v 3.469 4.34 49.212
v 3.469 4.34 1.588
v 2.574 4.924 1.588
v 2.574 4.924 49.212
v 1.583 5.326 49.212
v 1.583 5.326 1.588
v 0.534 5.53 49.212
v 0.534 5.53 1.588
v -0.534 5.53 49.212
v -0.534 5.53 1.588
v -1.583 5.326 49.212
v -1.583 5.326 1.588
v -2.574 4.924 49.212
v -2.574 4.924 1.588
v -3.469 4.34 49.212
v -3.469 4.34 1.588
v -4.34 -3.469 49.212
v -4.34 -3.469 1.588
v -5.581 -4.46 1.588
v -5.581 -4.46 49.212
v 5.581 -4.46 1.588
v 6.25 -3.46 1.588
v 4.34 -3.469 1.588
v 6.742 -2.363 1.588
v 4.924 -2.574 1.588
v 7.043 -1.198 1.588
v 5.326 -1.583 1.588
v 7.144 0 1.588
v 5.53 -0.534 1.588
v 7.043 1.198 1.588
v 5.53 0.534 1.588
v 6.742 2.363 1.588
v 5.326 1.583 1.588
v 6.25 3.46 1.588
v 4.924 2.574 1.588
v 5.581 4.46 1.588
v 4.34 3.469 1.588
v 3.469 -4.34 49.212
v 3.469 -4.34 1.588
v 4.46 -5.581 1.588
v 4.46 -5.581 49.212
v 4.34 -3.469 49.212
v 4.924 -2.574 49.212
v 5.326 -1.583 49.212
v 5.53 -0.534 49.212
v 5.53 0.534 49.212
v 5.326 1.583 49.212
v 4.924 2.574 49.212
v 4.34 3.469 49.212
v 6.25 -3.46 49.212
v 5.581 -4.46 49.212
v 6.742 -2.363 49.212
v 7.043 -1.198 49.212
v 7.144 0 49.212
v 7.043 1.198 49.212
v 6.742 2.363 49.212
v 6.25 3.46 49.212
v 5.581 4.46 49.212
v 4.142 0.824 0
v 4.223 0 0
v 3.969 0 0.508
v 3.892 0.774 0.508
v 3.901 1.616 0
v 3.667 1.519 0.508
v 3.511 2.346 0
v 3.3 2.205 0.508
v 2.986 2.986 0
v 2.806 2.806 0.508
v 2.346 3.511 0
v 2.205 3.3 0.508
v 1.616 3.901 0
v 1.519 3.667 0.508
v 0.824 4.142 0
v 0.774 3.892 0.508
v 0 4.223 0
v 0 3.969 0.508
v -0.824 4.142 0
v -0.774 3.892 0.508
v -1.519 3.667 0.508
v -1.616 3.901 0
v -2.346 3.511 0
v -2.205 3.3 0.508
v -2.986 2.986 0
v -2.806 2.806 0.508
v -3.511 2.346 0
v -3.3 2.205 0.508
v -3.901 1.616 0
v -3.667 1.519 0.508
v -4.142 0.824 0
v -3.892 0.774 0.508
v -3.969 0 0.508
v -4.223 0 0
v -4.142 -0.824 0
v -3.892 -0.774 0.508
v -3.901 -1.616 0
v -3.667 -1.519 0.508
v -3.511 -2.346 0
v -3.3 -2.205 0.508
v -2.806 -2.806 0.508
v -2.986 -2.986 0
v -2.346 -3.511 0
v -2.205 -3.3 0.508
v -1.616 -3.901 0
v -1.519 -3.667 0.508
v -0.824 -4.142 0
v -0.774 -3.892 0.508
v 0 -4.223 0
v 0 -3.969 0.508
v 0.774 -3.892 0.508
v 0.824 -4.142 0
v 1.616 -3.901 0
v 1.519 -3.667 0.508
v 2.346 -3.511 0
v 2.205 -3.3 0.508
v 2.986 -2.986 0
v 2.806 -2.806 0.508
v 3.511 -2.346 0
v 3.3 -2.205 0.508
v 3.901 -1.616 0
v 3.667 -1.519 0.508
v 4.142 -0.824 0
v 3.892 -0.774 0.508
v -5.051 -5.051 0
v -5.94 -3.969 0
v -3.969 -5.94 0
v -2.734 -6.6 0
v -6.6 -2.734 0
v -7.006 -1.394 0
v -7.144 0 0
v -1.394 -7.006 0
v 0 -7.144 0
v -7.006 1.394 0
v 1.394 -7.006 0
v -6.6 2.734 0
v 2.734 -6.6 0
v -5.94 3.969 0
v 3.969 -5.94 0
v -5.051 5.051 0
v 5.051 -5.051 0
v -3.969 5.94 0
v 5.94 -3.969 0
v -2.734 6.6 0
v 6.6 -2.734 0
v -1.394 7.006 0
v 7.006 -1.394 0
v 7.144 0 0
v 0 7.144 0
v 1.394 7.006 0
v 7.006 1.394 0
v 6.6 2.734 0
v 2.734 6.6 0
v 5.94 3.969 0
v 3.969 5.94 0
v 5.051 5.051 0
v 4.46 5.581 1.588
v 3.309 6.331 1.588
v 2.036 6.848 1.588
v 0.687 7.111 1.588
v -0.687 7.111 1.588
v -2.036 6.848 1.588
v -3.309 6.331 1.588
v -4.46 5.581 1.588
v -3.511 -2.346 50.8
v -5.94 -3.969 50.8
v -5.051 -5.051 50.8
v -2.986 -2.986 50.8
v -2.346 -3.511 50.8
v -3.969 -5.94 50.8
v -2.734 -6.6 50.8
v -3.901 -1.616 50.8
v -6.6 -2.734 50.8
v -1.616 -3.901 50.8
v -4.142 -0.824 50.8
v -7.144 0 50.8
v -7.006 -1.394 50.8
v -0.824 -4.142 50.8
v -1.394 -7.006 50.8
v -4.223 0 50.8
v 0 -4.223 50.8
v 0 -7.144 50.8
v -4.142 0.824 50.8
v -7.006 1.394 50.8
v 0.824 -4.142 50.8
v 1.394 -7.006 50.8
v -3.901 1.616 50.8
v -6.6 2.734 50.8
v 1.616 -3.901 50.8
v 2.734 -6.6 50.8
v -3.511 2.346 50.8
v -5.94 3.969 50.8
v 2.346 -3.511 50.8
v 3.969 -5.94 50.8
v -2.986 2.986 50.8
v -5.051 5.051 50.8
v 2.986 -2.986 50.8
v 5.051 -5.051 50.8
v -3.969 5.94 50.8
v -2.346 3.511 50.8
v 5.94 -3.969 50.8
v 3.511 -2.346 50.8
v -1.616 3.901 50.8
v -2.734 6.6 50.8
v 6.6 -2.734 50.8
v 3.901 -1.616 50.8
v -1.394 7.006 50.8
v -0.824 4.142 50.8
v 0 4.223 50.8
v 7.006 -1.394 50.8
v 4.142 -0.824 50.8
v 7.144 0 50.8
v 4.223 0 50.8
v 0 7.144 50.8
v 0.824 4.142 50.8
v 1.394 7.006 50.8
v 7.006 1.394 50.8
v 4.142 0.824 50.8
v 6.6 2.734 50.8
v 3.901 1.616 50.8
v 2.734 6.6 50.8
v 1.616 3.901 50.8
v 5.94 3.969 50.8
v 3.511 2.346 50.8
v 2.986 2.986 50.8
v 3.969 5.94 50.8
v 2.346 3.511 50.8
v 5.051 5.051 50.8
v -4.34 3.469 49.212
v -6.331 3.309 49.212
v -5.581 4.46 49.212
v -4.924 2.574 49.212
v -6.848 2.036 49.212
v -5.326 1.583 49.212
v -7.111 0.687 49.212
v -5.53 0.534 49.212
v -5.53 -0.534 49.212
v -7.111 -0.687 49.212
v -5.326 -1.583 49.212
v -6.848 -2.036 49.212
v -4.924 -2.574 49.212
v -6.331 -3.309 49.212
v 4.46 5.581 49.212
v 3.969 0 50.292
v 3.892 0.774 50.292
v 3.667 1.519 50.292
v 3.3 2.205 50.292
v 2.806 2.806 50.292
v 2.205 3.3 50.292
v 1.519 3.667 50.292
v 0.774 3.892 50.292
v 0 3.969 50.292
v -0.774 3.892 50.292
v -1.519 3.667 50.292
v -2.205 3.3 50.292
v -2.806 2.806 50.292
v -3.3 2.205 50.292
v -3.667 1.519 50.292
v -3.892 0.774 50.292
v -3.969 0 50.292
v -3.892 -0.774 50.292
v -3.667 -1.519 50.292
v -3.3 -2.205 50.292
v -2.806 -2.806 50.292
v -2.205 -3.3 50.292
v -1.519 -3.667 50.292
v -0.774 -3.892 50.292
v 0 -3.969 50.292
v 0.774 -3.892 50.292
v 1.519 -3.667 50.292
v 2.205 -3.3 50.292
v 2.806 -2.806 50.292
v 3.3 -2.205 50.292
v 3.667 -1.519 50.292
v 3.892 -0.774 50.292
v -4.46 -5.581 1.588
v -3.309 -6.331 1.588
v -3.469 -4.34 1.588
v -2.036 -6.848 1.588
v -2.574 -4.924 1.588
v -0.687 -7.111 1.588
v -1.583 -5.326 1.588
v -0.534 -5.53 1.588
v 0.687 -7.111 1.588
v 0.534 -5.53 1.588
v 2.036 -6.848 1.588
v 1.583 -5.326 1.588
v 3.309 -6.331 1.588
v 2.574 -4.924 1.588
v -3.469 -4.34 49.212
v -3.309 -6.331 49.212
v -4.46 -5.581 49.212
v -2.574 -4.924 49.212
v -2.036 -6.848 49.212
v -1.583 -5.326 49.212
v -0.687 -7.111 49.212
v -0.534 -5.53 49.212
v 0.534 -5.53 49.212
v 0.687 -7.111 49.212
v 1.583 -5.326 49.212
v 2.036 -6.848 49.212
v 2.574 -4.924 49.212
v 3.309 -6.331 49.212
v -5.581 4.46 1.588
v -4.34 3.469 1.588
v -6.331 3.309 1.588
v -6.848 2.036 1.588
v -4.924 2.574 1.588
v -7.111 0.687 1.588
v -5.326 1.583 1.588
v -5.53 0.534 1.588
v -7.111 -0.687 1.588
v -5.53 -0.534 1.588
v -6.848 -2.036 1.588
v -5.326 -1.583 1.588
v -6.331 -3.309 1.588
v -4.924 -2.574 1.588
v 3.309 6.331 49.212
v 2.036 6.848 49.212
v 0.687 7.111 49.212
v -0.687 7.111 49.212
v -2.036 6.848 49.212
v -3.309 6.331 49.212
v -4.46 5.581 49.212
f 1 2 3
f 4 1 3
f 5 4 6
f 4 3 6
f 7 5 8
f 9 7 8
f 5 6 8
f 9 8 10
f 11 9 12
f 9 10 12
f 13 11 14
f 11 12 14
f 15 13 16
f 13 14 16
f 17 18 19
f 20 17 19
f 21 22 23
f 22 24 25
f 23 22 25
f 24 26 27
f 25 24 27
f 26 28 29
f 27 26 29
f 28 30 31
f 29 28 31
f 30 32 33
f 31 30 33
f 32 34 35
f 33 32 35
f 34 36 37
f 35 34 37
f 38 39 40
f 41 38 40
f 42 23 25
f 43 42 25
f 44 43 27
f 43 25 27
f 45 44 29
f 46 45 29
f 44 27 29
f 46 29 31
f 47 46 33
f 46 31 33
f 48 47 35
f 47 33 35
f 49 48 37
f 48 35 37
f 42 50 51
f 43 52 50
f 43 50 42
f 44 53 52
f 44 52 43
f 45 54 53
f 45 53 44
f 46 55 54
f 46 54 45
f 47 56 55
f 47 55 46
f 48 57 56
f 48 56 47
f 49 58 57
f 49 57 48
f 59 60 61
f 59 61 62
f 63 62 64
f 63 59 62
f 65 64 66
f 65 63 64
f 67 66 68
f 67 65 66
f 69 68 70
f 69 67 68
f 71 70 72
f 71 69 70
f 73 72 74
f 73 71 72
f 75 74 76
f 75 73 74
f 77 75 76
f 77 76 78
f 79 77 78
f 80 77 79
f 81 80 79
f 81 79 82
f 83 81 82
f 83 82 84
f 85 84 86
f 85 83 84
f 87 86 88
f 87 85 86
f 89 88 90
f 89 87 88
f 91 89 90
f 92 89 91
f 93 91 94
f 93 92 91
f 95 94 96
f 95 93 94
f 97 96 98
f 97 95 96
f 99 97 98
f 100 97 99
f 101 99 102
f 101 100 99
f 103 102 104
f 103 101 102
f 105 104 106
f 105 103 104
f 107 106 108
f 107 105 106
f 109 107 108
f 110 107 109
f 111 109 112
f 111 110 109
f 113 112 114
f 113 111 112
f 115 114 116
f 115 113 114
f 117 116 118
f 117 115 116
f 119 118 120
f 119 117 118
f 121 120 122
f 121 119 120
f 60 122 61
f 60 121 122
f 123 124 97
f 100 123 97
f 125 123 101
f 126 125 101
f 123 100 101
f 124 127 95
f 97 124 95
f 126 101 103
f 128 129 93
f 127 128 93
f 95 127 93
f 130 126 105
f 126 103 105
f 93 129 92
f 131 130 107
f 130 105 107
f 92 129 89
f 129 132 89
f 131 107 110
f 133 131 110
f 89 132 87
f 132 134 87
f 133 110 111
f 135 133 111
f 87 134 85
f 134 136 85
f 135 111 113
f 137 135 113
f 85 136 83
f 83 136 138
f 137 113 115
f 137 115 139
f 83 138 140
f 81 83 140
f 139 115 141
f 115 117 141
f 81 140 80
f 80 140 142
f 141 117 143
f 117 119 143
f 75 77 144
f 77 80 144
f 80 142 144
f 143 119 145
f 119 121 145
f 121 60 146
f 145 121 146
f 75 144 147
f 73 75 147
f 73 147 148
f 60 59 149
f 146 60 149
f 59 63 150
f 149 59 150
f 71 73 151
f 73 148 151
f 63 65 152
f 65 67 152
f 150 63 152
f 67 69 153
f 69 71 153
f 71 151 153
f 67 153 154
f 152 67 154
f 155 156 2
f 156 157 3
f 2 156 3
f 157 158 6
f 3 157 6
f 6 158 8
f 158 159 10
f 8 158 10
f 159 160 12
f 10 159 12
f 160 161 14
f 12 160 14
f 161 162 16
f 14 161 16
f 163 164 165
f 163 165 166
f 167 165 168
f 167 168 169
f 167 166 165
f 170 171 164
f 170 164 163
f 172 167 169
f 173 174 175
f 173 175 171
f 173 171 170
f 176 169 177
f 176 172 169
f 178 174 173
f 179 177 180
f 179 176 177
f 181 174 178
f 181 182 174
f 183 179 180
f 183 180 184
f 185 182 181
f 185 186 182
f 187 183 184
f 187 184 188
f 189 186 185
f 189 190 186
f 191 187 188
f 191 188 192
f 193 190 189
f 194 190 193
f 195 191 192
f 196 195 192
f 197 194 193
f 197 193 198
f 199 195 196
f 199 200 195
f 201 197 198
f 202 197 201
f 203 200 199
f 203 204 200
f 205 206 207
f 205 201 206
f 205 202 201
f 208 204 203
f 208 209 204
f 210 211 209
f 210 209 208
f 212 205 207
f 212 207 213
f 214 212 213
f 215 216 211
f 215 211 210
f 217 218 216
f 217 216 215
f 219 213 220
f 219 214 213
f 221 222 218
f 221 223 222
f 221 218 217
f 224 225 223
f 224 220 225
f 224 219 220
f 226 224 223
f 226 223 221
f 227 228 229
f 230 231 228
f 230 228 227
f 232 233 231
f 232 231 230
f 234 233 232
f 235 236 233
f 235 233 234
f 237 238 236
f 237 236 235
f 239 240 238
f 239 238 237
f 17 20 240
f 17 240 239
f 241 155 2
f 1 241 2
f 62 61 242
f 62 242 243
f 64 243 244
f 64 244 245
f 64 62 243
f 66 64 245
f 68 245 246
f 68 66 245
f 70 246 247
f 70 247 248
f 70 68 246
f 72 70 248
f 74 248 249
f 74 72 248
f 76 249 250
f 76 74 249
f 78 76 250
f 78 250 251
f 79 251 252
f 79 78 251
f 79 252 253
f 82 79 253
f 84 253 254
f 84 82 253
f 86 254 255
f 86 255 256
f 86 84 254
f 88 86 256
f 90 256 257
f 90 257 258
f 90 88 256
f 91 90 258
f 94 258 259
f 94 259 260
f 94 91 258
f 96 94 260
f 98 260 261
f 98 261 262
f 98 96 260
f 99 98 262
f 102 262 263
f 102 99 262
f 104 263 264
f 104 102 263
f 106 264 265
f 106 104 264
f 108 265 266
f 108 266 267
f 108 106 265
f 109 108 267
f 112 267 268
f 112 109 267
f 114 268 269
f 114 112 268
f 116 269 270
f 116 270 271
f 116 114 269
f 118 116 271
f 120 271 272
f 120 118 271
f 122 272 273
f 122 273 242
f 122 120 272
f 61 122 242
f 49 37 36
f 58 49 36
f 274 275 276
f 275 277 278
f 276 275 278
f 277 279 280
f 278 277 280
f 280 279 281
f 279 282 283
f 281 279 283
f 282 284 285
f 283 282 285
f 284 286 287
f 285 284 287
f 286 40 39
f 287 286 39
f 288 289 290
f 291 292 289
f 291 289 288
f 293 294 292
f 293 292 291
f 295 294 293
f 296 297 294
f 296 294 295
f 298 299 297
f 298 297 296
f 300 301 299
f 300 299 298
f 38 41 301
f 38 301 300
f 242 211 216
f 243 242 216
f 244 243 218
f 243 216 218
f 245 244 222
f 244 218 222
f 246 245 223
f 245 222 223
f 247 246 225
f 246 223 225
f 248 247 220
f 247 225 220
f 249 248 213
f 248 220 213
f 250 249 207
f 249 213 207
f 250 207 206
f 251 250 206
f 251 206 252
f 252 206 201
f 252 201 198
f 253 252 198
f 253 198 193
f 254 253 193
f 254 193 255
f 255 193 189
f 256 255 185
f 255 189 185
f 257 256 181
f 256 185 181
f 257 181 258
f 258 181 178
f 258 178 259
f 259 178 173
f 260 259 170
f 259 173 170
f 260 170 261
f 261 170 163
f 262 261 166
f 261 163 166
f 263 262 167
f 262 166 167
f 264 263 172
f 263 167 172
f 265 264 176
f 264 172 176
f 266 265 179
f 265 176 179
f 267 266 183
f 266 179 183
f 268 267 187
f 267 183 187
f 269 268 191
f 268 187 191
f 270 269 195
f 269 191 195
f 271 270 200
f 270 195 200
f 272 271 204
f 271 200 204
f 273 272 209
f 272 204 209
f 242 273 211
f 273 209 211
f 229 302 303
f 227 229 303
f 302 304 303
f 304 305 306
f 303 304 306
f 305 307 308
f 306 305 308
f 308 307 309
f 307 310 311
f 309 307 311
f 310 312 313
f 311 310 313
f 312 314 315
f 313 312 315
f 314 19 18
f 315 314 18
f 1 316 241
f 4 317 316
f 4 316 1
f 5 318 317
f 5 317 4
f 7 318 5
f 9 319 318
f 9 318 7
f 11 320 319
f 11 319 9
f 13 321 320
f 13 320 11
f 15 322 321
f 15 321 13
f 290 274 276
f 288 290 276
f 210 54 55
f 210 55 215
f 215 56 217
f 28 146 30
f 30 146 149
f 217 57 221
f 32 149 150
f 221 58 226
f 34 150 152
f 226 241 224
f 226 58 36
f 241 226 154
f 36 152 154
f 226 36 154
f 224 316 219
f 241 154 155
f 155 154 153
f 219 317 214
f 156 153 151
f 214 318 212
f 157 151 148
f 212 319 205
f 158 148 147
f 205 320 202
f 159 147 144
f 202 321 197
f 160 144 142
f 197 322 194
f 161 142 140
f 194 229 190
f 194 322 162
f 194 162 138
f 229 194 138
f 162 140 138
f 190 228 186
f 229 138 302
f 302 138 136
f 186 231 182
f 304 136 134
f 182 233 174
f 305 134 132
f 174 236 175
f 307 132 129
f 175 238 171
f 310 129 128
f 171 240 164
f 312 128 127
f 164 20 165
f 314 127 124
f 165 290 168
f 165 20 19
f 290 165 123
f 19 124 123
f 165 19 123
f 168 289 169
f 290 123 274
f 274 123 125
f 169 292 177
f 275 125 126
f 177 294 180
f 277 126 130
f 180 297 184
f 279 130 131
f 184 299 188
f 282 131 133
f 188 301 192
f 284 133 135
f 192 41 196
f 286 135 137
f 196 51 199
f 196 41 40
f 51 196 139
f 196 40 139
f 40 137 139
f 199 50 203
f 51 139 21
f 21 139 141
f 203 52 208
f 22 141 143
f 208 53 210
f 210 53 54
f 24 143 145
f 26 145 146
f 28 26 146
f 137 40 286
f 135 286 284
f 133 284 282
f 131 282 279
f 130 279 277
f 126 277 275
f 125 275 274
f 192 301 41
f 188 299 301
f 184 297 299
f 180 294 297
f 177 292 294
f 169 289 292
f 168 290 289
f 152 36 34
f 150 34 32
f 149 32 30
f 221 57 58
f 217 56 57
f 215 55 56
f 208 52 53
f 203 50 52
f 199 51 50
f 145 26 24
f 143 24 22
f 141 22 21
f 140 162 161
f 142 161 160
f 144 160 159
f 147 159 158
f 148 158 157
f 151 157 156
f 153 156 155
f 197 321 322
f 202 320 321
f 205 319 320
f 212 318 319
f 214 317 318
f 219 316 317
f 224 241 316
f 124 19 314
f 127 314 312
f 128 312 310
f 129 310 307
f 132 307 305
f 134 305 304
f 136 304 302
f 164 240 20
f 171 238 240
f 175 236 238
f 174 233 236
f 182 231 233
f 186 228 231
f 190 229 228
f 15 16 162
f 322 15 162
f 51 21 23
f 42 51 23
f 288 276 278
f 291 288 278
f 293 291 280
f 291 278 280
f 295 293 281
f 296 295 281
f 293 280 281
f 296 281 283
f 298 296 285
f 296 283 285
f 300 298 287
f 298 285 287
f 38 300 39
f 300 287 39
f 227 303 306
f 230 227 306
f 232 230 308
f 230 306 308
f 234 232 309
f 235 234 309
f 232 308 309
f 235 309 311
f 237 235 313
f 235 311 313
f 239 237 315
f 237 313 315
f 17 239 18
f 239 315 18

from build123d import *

# Parameters (mm, degrees)
F0_R            = 7.14375
F0_R_2          = 3.96875
F1_DEPTH        = 50.8
F2_SIZE2        = 0.254
F2_SIZE         = 0.508
F6_DEPTH        = 47.625
F6_COPIES_COUNT = 4


# Not quite as in the source:
# - a pattern or mirror of a feature is missing from the dataset's text; its kind, count and spacing are read off the source's solid


with BuildPart() as f1:
    # F0 (on Top) → F1 (new body)
    with BuildSketch(Plane.XY):
        Circle(F0_R)
        Circle(F0_R_2, mode=Mode.SUBTRACT)
    extrude(amount=F1_DEPTH)

    # F2
    f2_edges = [f1.edges().sort_by_distance(p)[0] for p in [
        (-3.96875, 0, 50.8),
        (-3.96875, 0, 0),
    ]]
    f2_side = f1.faces().sort_by_distance((-3.96875, 0, 25.4))[0]
    chamfer(f2_edges, length=F2_SIZE, length2=F2_SIZE2, reference=f2_side)

    # F4 (on offset) → F6 (cut, through all)
    with BuildSketch(Plane(origin=(0, 0, 1.5875), x_dir=(1, 0, 0), z_dir=(0, 0, -1))):
        with BuildLine():
            ThreePointArc((-4.3404758524, -3.4687437838), (-5.55625, 0), (-4.3404758524, 3.4687437838))
            Line((-4.3404758524, 3.4687437838), (-5.5806118102, 4.4598134363))
            ThreePointArc((-5.5806118102, 4.4598134363), (-7.14375, 0), (-5.5806118102, -4.4598134363))
            Line((-5.5806118102, -4.4598134363), (-4.3404758524, -3.4687437838))
        make_face()
    f6 = extrude(amount=-F6_DEPTH, mode=Mode.SUBTRACT)

    # F6_copies: F6 ×4 about axis
    f6_copies_axis = Axis((0, 0, 0), (0, 0, 1))
    for i in range(1, F6_COPIES_COUNT):
        add(f6.rotate(f6_copies_axis, i * 360 / F6_COPIES_COUNT), mode=Mode.SUBTRACT)


solid = f1.part
